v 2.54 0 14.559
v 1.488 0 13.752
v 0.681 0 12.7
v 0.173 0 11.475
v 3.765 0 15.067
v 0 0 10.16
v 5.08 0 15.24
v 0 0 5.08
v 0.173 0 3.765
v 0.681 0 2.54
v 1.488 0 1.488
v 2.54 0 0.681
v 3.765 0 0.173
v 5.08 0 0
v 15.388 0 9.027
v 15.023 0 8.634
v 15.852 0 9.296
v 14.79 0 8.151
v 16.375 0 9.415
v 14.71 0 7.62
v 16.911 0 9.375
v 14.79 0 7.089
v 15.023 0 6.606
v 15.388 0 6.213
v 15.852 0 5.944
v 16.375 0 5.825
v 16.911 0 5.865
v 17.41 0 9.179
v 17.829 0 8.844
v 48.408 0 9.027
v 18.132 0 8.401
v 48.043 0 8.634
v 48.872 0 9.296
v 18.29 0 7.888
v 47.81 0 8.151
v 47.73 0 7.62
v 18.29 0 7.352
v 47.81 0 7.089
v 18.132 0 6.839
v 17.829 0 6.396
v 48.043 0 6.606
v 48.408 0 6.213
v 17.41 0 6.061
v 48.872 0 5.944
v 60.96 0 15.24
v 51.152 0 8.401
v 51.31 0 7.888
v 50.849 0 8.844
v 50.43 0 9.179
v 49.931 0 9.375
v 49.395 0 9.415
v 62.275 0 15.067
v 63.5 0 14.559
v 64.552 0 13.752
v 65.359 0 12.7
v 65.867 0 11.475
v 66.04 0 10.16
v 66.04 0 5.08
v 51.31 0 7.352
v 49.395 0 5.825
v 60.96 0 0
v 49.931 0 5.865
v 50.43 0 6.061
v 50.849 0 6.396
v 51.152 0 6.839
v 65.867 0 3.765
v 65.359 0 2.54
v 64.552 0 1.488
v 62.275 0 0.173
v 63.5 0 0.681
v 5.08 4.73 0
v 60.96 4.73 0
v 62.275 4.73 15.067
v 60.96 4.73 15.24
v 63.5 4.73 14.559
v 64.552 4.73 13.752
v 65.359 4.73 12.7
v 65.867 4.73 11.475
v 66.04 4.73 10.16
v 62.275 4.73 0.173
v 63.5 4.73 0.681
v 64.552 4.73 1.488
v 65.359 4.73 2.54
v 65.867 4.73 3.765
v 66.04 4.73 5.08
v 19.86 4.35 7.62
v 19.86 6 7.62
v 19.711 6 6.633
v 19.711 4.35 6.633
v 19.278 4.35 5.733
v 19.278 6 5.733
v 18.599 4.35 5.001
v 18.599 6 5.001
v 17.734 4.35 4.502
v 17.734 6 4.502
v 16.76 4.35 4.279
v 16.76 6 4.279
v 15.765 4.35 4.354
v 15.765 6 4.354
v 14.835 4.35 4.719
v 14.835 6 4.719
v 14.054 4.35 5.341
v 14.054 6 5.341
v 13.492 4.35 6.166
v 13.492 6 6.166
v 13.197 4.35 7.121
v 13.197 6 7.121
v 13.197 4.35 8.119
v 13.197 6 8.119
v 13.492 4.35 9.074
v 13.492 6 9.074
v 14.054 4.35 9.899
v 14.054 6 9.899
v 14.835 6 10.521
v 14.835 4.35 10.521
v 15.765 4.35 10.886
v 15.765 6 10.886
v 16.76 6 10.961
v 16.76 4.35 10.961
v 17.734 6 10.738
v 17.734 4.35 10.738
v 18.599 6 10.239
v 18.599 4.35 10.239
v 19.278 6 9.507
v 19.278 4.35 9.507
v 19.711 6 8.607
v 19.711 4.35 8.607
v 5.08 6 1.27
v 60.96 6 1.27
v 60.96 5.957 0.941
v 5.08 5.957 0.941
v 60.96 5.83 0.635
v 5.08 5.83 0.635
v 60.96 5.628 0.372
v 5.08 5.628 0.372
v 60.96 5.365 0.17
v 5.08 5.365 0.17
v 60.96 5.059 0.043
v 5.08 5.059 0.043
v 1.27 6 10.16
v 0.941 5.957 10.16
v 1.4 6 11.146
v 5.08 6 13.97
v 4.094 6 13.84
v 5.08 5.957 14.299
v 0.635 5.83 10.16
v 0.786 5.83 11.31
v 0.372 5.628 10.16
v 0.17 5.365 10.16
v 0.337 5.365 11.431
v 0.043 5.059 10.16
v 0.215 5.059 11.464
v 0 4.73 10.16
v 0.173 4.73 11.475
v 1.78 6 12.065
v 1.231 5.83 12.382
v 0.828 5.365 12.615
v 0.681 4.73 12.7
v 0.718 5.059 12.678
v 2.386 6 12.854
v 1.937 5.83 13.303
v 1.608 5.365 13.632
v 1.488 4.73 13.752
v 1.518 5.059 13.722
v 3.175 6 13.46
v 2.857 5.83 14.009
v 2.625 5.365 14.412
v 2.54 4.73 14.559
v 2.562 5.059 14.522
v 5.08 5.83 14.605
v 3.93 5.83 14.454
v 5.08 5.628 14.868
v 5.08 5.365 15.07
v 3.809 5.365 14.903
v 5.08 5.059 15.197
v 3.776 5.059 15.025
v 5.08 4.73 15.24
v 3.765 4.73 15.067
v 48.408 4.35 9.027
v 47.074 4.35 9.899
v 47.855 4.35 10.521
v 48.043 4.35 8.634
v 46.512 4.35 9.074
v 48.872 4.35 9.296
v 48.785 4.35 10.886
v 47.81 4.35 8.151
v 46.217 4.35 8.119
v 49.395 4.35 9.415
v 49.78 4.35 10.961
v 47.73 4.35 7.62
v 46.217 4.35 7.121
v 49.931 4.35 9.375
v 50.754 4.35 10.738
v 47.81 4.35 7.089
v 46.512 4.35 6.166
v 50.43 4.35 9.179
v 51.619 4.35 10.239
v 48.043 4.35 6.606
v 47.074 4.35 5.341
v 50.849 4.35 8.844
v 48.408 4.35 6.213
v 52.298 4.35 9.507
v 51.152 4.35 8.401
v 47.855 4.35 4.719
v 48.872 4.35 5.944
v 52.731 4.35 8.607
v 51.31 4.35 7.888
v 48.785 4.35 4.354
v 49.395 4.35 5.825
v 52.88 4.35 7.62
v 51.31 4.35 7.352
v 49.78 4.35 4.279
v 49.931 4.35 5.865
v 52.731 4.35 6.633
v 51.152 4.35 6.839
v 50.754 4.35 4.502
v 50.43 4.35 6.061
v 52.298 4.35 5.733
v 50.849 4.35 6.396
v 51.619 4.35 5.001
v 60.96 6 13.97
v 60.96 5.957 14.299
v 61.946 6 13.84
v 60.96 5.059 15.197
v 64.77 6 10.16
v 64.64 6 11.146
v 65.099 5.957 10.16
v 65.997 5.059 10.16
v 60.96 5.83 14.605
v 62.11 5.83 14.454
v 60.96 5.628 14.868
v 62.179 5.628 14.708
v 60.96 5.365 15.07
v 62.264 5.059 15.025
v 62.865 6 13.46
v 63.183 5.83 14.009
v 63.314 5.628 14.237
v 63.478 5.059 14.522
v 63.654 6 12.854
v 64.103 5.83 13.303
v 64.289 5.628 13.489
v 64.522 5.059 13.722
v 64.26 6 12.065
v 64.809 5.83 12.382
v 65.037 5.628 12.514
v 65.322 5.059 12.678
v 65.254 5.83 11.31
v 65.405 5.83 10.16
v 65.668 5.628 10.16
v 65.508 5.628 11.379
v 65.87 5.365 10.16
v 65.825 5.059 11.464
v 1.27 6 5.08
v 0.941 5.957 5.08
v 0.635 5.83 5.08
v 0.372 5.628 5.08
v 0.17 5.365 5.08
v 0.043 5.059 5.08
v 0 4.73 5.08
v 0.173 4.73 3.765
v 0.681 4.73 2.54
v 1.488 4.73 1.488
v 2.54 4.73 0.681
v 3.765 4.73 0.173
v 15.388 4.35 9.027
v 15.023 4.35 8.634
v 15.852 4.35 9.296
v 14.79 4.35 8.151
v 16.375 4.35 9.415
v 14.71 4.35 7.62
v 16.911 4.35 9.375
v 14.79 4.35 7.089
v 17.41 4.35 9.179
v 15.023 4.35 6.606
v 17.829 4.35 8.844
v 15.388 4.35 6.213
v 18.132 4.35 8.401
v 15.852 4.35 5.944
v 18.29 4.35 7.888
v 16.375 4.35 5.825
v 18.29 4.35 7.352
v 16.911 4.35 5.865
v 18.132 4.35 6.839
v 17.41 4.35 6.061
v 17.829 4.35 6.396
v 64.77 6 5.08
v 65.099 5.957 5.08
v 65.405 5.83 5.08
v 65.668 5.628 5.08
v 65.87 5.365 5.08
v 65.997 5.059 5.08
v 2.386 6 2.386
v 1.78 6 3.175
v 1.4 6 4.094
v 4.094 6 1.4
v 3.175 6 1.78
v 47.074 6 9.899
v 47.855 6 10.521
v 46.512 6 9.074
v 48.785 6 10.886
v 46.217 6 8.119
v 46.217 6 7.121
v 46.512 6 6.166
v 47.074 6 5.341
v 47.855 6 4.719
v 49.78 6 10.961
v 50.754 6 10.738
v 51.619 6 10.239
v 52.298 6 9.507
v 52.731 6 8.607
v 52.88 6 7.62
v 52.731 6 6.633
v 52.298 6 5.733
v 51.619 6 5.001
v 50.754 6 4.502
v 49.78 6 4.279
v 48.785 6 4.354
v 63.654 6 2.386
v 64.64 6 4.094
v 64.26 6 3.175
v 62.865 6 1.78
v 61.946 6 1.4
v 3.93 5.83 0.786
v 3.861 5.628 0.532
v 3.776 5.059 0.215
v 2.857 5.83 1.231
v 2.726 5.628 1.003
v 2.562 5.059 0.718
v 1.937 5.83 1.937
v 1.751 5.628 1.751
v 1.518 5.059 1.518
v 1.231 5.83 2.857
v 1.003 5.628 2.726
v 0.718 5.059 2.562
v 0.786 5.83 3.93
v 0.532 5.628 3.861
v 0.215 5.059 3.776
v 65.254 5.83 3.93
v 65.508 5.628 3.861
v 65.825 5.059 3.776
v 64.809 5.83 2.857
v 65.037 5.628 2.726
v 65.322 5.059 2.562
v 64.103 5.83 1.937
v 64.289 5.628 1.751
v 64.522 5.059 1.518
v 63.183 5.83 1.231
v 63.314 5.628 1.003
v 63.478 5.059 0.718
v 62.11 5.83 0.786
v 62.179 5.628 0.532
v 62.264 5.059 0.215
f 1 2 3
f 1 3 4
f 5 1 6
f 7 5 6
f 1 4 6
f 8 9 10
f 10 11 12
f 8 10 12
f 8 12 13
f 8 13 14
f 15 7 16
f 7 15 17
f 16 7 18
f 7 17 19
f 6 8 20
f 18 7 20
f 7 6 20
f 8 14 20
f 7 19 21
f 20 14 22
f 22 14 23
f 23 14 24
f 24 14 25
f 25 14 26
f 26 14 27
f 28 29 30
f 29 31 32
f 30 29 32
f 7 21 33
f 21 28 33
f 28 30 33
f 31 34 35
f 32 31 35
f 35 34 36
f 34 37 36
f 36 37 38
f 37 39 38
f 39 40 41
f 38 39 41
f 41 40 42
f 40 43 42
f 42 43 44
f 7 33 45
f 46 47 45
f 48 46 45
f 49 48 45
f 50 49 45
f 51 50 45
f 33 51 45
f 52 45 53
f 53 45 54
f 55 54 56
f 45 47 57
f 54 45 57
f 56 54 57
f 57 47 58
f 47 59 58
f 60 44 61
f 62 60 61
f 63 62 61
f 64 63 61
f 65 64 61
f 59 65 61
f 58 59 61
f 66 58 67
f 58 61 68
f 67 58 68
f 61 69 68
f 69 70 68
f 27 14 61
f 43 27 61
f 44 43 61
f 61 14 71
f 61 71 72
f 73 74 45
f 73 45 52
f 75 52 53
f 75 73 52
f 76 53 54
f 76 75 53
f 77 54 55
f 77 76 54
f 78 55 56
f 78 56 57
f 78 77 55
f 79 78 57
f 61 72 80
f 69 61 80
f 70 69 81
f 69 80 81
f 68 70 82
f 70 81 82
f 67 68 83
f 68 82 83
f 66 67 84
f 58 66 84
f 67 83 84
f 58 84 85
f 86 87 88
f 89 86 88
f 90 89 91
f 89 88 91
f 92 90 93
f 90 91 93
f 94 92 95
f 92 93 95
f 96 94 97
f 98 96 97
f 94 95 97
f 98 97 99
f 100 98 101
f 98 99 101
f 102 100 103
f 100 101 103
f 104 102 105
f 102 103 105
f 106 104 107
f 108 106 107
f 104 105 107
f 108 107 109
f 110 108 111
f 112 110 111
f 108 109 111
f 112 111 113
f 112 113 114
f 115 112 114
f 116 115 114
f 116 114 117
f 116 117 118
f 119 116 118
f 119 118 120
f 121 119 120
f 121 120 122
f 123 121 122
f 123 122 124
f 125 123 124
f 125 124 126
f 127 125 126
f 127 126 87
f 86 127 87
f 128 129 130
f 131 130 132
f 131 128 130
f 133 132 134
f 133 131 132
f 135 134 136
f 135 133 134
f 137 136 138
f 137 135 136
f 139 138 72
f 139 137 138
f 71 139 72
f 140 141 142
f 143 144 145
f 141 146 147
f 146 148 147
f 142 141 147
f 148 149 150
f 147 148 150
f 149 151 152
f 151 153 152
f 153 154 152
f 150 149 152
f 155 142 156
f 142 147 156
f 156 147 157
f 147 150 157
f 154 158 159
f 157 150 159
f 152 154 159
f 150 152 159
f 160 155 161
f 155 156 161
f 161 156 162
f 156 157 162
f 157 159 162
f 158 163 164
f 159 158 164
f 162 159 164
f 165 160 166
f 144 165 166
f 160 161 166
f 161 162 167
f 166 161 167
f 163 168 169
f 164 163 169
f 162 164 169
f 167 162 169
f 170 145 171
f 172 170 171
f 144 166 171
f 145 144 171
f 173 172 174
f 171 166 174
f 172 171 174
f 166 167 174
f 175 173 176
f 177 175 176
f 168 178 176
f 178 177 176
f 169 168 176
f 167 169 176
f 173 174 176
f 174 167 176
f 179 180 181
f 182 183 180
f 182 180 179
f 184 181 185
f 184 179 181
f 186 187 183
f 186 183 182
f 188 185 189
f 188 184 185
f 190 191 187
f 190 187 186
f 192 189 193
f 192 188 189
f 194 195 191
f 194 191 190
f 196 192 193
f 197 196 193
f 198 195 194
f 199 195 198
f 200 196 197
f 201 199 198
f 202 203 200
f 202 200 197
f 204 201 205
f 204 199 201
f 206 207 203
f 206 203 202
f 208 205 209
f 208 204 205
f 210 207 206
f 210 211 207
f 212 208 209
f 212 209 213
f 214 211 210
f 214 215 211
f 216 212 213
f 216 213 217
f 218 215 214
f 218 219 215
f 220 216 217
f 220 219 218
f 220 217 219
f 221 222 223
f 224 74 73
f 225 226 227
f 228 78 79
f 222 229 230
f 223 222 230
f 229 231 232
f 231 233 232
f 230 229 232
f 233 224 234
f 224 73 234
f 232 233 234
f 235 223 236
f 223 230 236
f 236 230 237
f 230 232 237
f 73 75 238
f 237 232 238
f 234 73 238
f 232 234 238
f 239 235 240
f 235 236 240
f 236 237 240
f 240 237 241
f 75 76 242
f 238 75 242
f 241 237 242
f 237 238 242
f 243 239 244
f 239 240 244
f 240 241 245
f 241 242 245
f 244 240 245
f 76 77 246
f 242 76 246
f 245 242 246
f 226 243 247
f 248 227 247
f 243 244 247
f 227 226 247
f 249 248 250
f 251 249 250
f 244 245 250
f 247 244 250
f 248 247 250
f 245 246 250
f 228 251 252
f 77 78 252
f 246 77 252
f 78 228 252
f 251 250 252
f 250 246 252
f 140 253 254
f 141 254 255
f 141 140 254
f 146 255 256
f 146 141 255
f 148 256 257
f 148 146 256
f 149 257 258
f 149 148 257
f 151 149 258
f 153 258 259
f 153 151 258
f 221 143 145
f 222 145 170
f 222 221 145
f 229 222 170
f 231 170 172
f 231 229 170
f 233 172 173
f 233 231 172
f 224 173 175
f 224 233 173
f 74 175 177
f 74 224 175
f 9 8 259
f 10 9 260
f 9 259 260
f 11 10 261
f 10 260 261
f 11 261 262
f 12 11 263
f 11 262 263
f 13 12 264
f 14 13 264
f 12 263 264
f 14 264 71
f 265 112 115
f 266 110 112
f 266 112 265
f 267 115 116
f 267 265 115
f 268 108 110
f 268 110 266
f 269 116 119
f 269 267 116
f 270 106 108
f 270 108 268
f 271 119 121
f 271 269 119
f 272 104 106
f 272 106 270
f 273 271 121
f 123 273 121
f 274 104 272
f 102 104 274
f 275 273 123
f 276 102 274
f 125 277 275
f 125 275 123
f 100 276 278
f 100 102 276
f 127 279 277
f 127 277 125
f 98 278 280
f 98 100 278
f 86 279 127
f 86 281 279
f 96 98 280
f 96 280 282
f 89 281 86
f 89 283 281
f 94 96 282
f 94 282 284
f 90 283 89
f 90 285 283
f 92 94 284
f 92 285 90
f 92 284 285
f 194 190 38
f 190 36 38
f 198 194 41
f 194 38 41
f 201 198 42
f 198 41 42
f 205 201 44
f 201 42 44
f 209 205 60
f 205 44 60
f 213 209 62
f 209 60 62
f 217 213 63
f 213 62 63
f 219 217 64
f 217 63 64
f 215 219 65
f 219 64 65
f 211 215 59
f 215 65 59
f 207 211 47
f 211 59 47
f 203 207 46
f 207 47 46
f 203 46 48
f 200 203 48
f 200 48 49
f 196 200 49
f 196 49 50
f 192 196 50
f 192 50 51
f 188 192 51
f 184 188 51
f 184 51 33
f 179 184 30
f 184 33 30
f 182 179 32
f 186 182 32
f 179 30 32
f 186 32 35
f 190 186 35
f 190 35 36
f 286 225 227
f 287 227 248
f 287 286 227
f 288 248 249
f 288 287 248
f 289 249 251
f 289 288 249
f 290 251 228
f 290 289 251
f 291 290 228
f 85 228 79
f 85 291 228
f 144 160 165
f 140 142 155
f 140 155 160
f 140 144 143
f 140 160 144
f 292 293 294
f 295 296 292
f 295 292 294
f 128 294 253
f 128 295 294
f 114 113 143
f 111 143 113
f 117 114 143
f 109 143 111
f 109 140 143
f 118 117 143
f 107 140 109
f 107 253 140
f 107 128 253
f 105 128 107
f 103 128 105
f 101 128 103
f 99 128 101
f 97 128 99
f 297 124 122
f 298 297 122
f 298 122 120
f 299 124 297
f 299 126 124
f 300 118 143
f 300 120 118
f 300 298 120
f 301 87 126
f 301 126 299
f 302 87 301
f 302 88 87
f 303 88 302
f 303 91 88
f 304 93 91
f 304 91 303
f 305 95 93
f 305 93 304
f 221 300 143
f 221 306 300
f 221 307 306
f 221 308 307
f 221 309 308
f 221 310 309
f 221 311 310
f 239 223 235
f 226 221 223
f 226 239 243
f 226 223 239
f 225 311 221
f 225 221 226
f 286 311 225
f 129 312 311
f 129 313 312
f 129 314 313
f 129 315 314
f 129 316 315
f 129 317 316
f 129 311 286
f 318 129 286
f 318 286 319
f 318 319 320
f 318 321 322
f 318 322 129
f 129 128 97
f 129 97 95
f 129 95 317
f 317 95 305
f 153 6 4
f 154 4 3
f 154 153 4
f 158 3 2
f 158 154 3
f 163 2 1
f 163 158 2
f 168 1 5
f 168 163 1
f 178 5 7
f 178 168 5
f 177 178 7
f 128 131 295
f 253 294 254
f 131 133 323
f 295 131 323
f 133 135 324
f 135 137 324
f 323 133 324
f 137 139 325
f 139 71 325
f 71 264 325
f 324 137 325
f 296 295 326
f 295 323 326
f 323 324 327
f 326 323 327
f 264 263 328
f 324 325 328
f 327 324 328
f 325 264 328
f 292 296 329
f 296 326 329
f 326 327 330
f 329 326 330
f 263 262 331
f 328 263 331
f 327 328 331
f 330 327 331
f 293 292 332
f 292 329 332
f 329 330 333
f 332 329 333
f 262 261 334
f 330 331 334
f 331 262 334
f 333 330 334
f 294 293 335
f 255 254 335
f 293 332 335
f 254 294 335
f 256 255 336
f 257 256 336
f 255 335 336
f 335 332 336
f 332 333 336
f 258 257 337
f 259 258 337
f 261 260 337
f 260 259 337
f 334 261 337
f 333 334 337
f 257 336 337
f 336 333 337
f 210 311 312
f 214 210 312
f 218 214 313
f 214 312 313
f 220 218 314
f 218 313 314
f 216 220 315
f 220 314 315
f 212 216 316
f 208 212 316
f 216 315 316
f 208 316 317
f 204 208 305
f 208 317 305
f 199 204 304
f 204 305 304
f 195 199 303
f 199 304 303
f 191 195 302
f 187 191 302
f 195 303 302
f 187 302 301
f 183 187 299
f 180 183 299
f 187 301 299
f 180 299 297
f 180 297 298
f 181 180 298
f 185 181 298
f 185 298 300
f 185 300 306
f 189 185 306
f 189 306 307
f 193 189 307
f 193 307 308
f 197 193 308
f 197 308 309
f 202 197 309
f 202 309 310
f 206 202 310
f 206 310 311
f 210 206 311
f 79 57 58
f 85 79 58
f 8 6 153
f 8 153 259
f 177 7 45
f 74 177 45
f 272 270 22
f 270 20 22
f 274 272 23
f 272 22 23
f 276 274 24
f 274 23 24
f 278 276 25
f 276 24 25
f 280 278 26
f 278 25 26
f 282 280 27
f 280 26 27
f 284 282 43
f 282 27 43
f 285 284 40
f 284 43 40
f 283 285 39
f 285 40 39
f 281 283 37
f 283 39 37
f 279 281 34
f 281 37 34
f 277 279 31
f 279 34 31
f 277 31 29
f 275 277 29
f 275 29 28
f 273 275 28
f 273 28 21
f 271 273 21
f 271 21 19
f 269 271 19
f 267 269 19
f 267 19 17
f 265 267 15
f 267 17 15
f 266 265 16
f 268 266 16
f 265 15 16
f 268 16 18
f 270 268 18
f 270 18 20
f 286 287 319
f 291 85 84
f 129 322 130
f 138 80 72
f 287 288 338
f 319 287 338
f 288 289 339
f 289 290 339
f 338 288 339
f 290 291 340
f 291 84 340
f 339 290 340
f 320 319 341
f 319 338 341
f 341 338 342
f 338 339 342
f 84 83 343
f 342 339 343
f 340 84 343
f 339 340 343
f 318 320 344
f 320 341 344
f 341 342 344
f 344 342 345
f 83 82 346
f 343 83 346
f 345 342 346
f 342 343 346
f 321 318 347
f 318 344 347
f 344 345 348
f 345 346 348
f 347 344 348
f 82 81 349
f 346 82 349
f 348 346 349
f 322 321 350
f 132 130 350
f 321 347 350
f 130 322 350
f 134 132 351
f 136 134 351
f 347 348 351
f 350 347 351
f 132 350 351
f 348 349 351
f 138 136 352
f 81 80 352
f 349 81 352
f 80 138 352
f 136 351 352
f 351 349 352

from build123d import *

# Parameters (mm, degrees)
SKETCH1_W                       = 66.04
SKETCH1_H                       = 15.24
BOSS_EXTRUDE1_DEPTH             = 6
CBORE_FOR_M3_SBHCS1_D           = 3.6
CBORE_FOR_M3_SBHCS1_CBORE_D     = 6.7
CBORE_FOR_M3_SBHCS1_CBORE_DEPTH = 1.65
FILLET1_R                       = 5.08
FILLET2_R                       = 1.27


with BuildPart() as part:
    # Sketch1 → Boss-Extrude1 (new body)
    with BuildSketch(Plane(origin=(0, 0, 0), x_dir=(1, 0, 0), z_dir=(0, 1, 0))):
        with Locations((33.02, -7.62)):
            Rectangle(SKETCH1_W, SKETCH1_H)
    extrude(amount=BOSS_EXTRUDE1_DEPTH)

    # CBORE for M3 SBHCS1 (through all)
    with Locations(Plane(origin=(0, 6, 0), x_dir=(1, 0, 0), z_dir=(0, 1, 0))):
        with Locations((16.51, -7.62), (49.53, -7.62)):
            CounterBoreHole(CBORE_FOR_M3_SBHCS1_D / 2, CBORE_FOR_M3_SBHCS1_CBORE_D / 2, CBORE_FOR_M3_SBHCS1_CBORE_DEPTH)

    # Fillet1
    fillet1_edges = [part.edges().sort_by_distance(p)[0] for p in [
        (0, 3, 0),
        (66.04, 3, 0),
        (66.04, 3, 15.24),
        (0, 3, 15.24),
    ]]
    fillet(fillet1_edges, radius=FILLET1_R)

    # Fillet2
    fillet2_edges = [part.edges().sort_by_distance(p)[0] for p in [
        (33.02, 6, 15.24),
        (0, 6, 7.62),
        (66.04, 6, 7.62),
        (33.02, 6, 0),
        (64.552102448, 6, 1.487897552),
        (64.552102448, 6, 13.752102448),
        (1.487897552, 6, 1.487897552),
        (1.487897552, 6, 13.752102448),
    ]]
    fillet(fillet2_edges, radius=FILLET2_R)


solid = part.part
